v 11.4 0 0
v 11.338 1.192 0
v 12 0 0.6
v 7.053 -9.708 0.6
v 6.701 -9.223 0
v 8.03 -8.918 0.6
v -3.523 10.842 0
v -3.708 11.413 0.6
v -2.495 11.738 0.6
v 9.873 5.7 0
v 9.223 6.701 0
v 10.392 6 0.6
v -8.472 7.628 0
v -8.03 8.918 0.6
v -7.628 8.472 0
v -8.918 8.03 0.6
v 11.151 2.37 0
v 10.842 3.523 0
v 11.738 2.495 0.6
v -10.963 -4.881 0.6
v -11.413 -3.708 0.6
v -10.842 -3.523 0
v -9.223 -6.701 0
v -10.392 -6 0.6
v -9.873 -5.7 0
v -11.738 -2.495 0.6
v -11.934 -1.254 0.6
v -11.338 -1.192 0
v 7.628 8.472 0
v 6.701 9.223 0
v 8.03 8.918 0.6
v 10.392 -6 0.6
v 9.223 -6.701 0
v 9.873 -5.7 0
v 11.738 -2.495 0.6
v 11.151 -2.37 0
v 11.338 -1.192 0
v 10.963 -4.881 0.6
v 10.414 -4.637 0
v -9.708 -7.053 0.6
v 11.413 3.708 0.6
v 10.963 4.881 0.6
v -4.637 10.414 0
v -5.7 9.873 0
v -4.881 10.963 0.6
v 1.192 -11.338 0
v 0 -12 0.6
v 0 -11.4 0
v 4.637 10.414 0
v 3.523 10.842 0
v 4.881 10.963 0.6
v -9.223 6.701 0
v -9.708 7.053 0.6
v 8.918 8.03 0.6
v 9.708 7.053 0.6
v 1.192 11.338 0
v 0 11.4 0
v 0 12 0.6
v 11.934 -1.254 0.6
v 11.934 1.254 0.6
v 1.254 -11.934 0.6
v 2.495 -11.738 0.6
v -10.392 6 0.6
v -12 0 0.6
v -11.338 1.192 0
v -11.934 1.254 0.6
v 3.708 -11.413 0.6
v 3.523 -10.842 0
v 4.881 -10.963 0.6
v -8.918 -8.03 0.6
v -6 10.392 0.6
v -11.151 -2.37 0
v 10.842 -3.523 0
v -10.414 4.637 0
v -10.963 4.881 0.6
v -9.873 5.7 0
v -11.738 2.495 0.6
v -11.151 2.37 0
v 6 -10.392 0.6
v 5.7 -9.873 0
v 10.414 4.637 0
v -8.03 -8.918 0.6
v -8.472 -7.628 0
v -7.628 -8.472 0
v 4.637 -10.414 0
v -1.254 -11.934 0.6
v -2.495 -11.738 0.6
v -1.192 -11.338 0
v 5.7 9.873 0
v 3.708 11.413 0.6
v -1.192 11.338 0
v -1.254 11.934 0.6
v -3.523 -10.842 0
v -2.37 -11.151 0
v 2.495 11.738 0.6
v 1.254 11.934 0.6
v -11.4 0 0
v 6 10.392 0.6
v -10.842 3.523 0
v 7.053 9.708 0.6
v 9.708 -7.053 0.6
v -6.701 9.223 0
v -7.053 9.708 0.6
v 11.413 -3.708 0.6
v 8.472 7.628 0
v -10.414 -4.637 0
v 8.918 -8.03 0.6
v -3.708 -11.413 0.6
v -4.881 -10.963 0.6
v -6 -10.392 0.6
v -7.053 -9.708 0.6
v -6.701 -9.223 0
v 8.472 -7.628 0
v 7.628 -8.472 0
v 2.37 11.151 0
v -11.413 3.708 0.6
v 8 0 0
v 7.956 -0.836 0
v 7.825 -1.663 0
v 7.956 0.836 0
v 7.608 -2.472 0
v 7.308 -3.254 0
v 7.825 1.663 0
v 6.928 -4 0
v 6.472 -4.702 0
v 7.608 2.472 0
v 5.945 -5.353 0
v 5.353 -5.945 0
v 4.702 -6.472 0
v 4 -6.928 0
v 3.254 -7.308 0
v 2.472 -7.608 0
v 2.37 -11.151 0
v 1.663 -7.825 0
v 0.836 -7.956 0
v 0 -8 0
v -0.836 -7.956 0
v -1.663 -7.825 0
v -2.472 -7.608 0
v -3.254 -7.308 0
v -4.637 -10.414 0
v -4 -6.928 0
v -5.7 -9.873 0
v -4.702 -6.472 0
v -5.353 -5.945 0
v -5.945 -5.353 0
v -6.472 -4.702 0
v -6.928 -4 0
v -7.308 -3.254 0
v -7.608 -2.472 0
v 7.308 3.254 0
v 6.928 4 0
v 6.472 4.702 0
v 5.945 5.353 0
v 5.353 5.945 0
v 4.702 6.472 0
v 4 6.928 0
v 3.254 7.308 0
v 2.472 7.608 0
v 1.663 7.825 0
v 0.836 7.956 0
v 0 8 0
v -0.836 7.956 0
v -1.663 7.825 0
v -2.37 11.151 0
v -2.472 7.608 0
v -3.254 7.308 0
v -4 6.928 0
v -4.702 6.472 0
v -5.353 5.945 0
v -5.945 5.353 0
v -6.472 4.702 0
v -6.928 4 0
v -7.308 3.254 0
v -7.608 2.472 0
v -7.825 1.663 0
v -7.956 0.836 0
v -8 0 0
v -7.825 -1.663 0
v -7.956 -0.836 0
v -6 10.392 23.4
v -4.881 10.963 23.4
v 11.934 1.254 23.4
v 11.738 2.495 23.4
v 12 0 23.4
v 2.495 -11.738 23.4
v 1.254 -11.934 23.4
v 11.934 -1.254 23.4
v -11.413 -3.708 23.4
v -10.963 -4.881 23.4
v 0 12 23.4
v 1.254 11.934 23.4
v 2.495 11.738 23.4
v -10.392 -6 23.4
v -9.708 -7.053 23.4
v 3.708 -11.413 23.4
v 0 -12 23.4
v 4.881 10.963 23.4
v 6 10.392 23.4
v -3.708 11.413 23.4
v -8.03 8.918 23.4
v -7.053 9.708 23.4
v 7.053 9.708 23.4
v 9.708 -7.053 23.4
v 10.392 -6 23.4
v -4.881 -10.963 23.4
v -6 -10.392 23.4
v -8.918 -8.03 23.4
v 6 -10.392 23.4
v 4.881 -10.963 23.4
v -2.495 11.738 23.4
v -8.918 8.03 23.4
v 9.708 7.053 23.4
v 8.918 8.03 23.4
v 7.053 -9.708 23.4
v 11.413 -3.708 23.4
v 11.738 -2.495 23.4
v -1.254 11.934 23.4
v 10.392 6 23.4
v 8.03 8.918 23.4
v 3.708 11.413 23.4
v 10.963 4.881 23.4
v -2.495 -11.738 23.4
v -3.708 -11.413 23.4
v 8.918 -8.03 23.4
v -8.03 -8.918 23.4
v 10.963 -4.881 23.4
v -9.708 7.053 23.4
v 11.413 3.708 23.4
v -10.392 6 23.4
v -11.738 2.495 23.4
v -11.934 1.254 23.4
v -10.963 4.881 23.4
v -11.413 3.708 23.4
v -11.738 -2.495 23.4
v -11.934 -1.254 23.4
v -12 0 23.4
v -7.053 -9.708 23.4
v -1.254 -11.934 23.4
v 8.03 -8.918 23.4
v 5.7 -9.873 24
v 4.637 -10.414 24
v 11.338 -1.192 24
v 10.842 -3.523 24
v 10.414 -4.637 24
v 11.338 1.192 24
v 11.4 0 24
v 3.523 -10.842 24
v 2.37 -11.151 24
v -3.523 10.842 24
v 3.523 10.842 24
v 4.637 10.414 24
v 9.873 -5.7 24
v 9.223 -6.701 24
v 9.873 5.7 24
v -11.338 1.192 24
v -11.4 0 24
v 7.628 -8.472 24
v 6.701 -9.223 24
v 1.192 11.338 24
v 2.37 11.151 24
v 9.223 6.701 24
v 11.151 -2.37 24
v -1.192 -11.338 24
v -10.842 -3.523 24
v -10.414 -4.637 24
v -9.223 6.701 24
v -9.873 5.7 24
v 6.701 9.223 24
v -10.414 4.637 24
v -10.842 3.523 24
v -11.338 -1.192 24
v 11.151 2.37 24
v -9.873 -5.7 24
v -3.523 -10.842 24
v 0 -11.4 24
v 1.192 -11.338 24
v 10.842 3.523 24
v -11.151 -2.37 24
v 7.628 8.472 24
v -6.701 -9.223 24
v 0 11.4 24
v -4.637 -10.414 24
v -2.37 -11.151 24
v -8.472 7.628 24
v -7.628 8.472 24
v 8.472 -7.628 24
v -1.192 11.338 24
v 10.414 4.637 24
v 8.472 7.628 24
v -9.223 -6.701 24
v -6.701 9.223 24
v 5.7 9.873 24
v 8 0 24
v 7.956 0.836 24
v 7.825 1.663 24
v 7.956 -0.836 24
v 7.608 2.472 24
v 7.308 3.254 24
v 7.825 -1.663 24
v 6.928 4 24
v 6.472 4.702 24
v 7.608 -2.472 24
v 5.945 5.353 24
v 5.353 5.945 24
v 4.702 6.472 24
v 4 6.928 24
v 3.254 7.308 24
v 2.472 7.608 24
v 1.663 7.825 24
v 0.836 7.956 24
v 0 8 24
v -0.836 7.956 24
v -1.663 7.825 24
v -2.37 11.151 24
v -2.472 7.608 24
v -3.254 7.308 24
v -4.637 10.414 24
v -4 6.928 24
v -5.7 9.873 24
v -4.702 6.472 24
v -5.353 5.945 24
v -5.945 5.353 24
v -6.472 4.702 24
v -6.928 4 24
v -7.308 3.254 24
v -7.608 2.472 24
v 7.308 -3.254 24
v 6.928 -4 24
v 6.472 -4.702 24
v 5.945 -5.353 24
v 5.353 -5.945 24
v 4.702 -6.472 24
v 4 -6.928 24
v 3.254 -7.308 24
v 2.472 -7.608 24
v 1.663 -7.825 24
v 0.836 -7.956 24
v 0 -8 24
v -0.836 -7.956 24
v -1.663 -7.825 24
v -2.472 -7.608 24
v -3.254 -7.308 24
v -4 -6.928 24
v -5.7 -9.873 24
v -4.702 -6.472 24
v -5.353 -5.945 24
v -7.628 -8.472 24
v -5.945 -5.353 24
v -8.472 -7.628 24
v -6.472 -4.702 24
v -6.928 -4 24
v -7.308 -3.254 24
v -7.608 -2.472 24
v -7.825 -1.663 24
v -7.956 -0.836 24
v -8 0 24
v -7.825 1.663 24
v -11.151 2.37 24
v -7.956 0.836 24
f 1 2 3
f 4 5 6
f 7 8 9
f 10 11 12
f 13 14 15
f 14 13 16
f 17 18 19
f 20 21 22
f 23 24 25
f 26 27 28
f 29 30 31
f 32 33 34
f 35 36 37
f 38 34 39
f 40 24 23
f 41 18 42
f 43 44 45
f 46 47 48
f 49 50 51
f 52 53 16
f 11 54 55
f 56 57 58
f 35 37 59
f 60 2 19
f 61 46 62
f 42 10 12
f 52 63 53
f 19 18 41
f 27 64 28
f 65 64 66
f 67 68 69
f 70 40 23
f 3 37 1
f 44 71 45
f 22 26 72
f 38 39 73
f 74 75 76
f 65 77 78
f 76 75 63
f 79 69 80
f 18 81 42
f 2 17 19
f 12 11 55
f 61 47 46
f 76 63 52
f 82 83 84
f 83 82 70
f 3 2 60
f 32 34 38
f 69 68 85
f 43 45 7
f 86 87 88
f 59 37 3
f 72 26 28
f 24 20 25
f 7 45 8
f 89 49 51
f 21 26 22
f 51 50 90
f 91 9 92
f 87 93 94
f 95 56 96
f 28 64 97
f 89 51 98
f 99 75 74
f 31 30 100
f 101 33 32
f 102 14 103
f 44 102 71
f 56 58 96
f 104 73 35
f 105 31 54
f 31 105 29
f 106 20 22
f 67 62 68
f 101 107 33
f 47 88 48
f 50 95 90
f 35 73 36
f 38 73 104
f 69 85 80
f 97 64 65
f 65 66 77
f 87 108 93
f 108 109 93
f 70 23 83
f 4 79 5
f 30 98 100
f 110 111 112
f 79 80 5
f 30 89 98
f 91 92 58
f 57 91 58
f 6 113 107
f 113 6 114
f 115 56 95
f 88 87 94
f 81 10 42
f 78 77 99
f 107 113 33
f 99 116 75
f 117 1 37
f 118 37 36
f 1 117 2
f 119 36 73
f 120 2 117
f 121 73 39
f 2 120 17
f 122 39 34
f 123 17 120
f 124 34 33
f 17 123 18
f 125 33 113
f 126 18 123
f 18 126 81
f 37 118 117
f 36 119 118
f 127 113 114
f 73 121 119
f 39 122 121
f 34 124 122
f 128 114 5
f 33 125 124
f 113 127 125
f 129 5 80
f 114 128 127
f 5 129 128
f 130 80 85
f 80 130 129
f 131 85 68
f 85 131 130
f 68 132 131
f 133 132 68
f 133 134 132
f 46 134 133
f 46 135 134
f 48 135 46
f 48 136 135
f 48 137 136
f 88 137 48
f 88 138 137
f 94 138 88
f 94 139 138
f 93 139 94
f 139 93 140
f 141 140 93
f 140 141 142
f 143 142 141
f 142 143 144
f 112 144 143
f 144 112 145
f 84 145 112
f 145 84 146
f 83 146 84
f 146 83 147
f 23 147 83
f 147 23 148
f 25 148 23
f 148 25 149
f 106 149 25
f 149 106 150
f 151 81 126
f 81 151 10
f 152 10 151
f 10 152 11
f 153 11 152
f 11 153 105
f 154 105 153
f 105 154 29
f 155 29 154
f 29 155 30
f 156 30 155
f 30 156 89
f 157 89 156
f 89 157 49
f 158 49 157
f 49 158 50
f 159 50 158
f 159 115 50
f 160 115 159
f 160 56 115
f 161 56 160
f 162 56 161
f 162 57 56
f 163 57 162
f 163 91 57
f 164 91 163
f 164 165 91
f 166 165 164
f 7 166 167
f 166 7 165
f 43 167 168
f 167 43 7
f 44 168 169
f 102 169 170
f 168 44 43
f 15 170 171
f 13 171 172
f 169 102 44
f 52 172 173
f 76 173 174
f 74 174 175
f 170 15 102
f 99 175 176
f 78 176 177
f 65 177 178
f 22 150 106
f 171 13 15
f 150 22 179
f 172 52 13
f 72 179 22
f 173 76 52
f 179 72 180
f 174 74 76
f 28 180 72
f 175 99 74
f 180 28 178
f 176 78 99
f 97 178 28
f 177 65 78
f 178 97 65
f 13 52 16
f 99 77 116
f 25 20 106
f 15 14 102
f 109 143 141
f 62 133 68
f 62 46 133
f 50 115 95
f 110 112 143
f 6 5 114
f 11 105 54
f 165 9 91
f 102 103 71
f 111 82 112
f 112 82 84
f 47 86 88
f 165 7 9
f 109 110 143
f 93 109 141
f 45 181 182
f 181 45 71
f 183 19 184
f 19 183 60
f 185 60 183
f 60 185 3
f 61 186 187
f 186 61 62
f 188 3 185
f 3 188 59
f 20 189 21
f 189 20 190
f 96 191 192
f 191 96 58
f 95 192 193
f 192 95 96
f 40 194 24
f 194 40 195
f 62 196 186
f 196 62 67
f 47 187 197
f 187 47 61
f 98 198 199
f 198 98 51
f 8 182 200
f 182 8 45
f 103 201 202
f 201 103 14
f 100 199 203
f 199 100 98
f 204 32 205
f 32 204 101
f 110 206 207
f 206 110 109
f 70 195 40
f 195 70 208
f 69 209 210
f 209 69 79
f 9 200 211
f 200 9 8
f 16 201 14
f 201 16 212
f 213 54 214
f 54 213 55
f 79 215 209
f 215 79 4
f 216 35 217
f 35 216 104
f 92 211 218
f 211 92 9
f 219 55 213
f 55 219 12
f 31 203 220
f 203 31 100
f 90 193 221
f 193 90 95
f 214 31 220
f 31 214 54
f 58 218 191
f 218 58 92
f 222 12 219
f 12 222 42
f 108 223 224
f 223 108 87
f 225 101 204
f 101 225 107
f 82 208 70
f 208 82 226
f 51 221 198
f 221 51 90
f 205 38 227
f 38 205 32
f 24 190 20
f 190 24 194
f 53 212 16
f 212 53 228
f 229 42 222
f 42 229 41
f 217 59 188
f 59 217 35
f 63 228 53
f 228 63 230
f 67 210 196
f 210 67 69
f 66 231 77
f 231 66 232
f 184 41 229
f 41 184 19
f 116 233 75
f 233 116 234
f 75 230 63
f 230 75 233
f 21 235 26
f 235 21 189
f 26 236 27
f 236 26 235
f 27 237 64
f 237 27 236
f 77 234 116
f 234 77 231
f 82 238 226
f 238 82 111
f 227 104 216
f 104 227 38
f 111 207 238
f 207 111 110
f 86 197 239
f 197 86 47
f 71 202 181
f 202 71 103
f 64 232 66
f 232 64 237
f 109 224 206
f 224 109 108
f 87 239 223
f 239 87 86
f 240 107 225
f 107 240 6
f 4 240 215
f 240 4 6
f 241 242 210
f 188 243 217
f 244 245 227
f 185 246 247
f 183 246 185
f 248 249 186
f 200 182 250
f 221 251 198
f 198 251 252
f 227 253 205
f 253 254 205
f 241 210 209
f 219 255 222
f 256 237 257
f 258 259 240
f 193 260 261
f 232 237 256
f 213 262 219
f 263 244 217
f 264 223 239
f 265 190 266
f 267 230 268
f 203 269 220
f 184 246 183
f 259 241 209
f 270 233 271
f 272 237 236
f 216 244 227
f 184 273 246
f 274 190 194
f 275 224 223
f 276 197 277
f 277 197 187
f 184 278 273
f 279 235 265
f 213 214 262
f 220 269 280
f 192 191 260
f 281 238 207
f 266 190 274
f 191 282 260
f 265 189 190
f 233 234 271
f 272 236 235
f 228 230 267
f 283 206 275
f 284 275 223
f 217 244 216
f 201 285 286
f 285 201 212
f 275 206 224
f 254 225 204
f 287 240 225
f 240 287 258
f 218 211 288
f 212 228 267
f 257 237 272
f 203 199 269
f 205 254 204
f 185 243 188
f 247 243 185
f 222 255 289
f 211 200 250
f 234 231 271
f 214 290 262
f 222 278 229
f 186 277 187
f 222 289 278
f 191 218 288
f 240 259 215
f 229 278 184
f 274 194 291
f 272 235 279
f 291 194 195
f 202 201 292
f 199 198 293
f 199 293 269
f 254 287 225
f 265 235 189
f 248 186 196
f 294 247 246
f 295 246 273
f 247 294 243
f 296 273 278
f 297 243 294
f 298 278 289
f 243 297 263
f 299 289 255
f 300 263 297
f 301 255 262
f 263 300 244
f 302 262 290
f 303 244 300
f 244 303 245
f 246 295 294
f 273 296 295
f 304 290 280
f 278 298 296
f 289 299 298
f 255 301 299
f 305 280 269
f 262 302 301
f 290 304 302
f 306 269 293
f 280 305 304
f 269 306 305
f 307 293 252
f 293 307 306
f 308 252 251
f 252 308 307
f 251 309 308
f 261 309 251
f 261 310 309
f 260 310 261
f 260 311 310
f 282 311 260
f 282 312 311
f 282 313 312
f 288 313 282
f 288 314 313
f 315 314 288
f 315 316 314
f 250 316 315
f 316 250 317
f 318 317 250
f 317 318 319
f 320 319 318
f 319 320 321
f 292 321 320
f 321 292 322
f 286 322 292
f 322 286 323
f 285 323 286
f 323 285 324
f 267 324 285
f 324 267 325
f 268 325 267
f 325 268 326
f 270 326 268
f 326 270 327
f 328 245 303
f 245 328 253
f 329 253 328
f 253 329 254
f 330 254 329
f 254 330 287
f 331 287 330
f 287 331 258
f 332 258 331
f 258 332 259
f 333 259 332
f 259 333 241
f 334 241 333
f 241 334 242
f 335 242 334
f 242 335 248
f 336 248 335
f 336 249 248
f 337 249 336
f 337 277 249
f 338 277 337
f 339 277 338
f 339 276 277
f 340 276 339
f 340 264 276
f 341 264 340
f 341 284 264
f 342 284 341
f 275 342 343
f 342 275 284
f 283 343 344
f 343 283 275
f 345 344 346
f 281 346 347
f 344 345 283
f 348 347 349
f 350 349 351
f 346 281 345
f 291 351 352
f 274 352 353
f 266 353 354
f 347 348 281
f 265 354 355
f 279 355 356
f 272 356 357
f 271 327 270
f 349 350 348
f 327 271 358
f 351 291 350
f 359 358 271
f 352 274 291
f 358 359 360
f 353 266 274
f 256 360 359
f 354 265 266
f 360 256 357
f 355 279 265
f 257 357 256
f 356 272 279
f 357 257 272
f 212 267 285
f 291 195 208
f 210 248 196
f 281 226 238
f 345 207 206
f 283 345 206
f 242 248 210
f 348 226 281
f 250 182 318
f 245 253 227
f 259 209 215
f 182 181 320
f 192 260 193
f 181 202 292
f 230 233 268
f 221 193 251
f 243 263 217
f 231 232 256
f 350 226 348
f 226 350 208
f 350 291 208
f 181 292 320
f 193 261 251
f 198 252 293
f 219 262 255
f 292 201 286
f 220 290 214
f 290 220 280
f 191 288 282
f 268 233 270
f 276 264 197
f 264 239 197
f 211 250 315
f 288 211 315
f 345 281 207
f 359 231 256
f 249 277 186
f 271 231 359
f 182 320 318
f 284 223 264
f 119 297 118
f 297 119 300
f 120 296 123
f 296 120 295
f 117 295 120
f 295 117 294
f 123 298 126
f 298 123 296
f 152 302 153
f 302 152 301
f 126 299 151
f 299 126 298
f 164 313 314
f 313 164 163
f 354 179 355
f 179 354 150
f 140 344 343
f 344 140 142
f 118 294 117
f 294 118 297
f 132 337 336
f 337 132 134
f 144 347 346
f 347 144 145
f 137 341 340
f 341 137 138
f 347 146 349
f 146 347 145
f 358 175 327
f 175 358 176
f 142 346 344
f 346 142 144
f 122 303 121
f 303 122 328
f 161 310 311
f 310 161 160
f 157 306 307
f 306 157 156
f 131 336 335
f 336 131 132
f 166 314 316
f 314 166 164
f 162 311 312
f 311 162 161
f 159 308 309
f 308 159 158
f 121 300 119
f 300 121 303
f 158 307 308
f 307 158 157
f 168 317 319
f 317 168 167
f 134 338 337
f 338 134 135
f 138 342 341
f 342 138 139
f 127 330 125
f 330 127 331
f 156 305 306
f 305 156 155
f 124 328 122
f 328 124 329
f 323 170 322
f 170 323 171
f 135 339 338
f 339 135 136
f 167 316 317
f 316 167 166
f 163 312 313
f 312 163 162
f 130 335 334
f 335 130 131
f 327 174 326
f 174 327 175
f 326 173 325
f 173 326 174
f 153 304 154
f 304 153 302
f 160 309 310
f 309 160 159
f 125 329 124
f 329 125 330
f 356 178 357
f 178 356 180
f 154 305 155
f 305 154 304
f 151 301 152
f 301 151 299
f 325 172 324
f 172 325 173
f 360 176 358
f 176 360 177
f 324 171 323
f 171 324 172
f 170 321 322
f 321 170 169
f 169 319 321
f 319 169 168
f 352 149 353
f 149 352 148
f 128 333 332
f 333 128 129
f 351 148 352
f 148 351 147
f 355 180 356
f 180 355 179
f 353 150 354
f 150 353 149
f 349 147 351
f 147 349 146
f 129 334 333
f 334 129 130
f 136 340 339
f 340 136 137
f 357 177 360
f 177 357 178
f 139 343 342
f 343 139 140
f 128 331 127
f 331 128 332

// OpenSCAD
// Plain sleeve bushing.
$fn = 60;
eps = 0.02;
inner_d = 16;
outer_d = 24;
length = 24;
chamfer = 0.6;
difference() {
    union() {
        cylinder(d1 = outer_d - 2 * chamfer, d2 = outer_d, h = chamfer);
        translate([0, 0, chamfer]) cylinder(d = outer_d, h = length - 2 * chamfer);
        translate([0, 0, length - chamfer]) cylinder(d1 = outer_d, d2 = outer_d - 2 * chamfer, h = chamfer);
    }
    translate([0, 0, -eps]) cylinder(d = inner_d, h = length + 2 * eps);
}
